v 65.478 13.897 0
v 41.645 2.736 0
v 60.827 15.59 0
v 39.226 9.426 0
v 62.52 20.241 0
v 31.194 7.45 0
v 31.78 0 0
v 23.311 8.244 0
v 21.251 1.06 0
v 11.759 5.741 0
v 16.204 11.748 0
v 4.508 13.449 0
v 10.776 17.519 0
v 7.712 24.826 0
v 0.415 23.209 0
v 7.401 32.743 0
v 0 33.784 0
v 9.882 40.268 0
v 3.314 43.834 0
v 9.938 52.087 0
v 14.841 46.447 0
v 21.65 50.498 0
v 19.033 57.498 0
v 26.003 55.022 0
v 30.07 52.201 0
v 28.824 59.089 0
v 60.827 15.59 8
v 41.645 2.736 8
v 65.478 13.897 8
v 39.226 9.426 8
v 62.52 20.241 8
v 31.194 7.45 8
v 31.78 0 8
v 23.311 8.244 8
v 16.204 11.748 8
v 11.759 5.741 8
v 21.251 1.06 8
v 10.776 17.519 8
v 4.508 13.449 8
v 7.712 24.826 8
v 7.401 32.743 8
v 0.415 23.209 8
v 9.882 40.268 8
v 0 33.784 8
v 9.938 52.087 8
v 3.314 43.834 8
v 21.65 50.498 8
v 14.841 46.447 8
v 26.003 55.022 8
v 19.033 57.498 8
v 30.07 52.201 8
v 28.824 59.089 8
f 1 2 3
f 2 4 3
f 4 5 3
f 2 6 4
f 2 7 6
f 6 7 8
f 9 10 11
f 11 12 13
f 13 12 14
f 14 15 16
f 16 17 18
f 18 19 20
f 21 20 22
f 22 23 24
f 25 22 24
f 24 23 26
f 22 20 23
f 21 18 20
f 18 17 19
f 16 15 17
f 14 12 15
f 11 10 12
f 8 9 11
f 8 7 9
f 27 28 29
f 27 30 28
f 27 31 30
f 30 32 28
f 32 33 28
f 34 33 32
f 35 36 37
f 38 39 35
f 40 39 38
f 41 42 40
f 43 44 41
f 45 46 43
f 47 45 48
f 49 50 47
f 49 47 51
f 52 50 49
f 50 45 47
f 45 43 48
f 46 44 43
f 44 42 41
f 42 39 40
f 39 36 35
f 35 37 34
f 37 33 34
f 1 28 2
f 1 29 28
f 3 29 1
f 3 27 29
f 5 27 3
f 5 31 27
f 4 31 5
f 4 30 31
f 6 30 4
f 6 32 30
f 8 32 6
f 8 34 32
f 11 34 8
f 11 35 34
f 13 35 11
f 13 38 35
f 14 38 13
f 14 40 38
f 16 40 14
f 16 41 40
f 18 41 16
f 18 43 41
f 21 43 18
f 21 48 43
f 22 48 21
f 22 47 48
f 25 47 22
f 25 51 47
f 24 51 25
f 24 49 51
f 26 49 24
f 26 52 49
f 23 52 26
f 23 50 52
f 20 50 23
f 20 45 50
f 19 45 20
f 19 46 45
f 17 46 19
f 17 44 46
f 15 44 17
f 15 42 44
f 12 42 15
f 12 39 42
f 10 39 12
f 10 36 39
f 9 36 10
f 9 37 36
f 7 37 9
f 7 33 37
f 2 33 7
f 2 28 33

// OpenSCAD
$fn = 32;

// ----------------------------------------------------------------------
// Hook plate: curl radius 26 mm over 205 degrees, 7 mm thick band
// ----------------------------------------------------------------------

// --- parameters (mm) ---
profile_height = 8;       // extrusion height
profile_points = 26;      // points of the closed outline

profile = [[26.003, 55.022], [28.824, 59.089], [19.033, 57.498], [9.938, 52.087], [3.314, 43.834], [0, 33.784], [0.415, 23.209], [4.508, 13.449], [11.759, 5.741], [21.251, 1.06], [31.78, 0], [41.645, 2.736], [65.478, 13.897], [60.827, 15.59], [62.52, 20.241], [39.226, 9.426], [31.194, 7.45], [23.311, 8.244], [16.204, 11.748], [10.776, 17.519], [7.712, 24.826], [7.401, 32.743], [9.882, 40.268], [14.841, 46.447], [21.65, 50.498], [30.07, 52.201]];  // single closed polygon, 26 points, counter clockwise

// --- the one profile operation ---
linear_extrude(height = profile_height) polygon(points = profile);
